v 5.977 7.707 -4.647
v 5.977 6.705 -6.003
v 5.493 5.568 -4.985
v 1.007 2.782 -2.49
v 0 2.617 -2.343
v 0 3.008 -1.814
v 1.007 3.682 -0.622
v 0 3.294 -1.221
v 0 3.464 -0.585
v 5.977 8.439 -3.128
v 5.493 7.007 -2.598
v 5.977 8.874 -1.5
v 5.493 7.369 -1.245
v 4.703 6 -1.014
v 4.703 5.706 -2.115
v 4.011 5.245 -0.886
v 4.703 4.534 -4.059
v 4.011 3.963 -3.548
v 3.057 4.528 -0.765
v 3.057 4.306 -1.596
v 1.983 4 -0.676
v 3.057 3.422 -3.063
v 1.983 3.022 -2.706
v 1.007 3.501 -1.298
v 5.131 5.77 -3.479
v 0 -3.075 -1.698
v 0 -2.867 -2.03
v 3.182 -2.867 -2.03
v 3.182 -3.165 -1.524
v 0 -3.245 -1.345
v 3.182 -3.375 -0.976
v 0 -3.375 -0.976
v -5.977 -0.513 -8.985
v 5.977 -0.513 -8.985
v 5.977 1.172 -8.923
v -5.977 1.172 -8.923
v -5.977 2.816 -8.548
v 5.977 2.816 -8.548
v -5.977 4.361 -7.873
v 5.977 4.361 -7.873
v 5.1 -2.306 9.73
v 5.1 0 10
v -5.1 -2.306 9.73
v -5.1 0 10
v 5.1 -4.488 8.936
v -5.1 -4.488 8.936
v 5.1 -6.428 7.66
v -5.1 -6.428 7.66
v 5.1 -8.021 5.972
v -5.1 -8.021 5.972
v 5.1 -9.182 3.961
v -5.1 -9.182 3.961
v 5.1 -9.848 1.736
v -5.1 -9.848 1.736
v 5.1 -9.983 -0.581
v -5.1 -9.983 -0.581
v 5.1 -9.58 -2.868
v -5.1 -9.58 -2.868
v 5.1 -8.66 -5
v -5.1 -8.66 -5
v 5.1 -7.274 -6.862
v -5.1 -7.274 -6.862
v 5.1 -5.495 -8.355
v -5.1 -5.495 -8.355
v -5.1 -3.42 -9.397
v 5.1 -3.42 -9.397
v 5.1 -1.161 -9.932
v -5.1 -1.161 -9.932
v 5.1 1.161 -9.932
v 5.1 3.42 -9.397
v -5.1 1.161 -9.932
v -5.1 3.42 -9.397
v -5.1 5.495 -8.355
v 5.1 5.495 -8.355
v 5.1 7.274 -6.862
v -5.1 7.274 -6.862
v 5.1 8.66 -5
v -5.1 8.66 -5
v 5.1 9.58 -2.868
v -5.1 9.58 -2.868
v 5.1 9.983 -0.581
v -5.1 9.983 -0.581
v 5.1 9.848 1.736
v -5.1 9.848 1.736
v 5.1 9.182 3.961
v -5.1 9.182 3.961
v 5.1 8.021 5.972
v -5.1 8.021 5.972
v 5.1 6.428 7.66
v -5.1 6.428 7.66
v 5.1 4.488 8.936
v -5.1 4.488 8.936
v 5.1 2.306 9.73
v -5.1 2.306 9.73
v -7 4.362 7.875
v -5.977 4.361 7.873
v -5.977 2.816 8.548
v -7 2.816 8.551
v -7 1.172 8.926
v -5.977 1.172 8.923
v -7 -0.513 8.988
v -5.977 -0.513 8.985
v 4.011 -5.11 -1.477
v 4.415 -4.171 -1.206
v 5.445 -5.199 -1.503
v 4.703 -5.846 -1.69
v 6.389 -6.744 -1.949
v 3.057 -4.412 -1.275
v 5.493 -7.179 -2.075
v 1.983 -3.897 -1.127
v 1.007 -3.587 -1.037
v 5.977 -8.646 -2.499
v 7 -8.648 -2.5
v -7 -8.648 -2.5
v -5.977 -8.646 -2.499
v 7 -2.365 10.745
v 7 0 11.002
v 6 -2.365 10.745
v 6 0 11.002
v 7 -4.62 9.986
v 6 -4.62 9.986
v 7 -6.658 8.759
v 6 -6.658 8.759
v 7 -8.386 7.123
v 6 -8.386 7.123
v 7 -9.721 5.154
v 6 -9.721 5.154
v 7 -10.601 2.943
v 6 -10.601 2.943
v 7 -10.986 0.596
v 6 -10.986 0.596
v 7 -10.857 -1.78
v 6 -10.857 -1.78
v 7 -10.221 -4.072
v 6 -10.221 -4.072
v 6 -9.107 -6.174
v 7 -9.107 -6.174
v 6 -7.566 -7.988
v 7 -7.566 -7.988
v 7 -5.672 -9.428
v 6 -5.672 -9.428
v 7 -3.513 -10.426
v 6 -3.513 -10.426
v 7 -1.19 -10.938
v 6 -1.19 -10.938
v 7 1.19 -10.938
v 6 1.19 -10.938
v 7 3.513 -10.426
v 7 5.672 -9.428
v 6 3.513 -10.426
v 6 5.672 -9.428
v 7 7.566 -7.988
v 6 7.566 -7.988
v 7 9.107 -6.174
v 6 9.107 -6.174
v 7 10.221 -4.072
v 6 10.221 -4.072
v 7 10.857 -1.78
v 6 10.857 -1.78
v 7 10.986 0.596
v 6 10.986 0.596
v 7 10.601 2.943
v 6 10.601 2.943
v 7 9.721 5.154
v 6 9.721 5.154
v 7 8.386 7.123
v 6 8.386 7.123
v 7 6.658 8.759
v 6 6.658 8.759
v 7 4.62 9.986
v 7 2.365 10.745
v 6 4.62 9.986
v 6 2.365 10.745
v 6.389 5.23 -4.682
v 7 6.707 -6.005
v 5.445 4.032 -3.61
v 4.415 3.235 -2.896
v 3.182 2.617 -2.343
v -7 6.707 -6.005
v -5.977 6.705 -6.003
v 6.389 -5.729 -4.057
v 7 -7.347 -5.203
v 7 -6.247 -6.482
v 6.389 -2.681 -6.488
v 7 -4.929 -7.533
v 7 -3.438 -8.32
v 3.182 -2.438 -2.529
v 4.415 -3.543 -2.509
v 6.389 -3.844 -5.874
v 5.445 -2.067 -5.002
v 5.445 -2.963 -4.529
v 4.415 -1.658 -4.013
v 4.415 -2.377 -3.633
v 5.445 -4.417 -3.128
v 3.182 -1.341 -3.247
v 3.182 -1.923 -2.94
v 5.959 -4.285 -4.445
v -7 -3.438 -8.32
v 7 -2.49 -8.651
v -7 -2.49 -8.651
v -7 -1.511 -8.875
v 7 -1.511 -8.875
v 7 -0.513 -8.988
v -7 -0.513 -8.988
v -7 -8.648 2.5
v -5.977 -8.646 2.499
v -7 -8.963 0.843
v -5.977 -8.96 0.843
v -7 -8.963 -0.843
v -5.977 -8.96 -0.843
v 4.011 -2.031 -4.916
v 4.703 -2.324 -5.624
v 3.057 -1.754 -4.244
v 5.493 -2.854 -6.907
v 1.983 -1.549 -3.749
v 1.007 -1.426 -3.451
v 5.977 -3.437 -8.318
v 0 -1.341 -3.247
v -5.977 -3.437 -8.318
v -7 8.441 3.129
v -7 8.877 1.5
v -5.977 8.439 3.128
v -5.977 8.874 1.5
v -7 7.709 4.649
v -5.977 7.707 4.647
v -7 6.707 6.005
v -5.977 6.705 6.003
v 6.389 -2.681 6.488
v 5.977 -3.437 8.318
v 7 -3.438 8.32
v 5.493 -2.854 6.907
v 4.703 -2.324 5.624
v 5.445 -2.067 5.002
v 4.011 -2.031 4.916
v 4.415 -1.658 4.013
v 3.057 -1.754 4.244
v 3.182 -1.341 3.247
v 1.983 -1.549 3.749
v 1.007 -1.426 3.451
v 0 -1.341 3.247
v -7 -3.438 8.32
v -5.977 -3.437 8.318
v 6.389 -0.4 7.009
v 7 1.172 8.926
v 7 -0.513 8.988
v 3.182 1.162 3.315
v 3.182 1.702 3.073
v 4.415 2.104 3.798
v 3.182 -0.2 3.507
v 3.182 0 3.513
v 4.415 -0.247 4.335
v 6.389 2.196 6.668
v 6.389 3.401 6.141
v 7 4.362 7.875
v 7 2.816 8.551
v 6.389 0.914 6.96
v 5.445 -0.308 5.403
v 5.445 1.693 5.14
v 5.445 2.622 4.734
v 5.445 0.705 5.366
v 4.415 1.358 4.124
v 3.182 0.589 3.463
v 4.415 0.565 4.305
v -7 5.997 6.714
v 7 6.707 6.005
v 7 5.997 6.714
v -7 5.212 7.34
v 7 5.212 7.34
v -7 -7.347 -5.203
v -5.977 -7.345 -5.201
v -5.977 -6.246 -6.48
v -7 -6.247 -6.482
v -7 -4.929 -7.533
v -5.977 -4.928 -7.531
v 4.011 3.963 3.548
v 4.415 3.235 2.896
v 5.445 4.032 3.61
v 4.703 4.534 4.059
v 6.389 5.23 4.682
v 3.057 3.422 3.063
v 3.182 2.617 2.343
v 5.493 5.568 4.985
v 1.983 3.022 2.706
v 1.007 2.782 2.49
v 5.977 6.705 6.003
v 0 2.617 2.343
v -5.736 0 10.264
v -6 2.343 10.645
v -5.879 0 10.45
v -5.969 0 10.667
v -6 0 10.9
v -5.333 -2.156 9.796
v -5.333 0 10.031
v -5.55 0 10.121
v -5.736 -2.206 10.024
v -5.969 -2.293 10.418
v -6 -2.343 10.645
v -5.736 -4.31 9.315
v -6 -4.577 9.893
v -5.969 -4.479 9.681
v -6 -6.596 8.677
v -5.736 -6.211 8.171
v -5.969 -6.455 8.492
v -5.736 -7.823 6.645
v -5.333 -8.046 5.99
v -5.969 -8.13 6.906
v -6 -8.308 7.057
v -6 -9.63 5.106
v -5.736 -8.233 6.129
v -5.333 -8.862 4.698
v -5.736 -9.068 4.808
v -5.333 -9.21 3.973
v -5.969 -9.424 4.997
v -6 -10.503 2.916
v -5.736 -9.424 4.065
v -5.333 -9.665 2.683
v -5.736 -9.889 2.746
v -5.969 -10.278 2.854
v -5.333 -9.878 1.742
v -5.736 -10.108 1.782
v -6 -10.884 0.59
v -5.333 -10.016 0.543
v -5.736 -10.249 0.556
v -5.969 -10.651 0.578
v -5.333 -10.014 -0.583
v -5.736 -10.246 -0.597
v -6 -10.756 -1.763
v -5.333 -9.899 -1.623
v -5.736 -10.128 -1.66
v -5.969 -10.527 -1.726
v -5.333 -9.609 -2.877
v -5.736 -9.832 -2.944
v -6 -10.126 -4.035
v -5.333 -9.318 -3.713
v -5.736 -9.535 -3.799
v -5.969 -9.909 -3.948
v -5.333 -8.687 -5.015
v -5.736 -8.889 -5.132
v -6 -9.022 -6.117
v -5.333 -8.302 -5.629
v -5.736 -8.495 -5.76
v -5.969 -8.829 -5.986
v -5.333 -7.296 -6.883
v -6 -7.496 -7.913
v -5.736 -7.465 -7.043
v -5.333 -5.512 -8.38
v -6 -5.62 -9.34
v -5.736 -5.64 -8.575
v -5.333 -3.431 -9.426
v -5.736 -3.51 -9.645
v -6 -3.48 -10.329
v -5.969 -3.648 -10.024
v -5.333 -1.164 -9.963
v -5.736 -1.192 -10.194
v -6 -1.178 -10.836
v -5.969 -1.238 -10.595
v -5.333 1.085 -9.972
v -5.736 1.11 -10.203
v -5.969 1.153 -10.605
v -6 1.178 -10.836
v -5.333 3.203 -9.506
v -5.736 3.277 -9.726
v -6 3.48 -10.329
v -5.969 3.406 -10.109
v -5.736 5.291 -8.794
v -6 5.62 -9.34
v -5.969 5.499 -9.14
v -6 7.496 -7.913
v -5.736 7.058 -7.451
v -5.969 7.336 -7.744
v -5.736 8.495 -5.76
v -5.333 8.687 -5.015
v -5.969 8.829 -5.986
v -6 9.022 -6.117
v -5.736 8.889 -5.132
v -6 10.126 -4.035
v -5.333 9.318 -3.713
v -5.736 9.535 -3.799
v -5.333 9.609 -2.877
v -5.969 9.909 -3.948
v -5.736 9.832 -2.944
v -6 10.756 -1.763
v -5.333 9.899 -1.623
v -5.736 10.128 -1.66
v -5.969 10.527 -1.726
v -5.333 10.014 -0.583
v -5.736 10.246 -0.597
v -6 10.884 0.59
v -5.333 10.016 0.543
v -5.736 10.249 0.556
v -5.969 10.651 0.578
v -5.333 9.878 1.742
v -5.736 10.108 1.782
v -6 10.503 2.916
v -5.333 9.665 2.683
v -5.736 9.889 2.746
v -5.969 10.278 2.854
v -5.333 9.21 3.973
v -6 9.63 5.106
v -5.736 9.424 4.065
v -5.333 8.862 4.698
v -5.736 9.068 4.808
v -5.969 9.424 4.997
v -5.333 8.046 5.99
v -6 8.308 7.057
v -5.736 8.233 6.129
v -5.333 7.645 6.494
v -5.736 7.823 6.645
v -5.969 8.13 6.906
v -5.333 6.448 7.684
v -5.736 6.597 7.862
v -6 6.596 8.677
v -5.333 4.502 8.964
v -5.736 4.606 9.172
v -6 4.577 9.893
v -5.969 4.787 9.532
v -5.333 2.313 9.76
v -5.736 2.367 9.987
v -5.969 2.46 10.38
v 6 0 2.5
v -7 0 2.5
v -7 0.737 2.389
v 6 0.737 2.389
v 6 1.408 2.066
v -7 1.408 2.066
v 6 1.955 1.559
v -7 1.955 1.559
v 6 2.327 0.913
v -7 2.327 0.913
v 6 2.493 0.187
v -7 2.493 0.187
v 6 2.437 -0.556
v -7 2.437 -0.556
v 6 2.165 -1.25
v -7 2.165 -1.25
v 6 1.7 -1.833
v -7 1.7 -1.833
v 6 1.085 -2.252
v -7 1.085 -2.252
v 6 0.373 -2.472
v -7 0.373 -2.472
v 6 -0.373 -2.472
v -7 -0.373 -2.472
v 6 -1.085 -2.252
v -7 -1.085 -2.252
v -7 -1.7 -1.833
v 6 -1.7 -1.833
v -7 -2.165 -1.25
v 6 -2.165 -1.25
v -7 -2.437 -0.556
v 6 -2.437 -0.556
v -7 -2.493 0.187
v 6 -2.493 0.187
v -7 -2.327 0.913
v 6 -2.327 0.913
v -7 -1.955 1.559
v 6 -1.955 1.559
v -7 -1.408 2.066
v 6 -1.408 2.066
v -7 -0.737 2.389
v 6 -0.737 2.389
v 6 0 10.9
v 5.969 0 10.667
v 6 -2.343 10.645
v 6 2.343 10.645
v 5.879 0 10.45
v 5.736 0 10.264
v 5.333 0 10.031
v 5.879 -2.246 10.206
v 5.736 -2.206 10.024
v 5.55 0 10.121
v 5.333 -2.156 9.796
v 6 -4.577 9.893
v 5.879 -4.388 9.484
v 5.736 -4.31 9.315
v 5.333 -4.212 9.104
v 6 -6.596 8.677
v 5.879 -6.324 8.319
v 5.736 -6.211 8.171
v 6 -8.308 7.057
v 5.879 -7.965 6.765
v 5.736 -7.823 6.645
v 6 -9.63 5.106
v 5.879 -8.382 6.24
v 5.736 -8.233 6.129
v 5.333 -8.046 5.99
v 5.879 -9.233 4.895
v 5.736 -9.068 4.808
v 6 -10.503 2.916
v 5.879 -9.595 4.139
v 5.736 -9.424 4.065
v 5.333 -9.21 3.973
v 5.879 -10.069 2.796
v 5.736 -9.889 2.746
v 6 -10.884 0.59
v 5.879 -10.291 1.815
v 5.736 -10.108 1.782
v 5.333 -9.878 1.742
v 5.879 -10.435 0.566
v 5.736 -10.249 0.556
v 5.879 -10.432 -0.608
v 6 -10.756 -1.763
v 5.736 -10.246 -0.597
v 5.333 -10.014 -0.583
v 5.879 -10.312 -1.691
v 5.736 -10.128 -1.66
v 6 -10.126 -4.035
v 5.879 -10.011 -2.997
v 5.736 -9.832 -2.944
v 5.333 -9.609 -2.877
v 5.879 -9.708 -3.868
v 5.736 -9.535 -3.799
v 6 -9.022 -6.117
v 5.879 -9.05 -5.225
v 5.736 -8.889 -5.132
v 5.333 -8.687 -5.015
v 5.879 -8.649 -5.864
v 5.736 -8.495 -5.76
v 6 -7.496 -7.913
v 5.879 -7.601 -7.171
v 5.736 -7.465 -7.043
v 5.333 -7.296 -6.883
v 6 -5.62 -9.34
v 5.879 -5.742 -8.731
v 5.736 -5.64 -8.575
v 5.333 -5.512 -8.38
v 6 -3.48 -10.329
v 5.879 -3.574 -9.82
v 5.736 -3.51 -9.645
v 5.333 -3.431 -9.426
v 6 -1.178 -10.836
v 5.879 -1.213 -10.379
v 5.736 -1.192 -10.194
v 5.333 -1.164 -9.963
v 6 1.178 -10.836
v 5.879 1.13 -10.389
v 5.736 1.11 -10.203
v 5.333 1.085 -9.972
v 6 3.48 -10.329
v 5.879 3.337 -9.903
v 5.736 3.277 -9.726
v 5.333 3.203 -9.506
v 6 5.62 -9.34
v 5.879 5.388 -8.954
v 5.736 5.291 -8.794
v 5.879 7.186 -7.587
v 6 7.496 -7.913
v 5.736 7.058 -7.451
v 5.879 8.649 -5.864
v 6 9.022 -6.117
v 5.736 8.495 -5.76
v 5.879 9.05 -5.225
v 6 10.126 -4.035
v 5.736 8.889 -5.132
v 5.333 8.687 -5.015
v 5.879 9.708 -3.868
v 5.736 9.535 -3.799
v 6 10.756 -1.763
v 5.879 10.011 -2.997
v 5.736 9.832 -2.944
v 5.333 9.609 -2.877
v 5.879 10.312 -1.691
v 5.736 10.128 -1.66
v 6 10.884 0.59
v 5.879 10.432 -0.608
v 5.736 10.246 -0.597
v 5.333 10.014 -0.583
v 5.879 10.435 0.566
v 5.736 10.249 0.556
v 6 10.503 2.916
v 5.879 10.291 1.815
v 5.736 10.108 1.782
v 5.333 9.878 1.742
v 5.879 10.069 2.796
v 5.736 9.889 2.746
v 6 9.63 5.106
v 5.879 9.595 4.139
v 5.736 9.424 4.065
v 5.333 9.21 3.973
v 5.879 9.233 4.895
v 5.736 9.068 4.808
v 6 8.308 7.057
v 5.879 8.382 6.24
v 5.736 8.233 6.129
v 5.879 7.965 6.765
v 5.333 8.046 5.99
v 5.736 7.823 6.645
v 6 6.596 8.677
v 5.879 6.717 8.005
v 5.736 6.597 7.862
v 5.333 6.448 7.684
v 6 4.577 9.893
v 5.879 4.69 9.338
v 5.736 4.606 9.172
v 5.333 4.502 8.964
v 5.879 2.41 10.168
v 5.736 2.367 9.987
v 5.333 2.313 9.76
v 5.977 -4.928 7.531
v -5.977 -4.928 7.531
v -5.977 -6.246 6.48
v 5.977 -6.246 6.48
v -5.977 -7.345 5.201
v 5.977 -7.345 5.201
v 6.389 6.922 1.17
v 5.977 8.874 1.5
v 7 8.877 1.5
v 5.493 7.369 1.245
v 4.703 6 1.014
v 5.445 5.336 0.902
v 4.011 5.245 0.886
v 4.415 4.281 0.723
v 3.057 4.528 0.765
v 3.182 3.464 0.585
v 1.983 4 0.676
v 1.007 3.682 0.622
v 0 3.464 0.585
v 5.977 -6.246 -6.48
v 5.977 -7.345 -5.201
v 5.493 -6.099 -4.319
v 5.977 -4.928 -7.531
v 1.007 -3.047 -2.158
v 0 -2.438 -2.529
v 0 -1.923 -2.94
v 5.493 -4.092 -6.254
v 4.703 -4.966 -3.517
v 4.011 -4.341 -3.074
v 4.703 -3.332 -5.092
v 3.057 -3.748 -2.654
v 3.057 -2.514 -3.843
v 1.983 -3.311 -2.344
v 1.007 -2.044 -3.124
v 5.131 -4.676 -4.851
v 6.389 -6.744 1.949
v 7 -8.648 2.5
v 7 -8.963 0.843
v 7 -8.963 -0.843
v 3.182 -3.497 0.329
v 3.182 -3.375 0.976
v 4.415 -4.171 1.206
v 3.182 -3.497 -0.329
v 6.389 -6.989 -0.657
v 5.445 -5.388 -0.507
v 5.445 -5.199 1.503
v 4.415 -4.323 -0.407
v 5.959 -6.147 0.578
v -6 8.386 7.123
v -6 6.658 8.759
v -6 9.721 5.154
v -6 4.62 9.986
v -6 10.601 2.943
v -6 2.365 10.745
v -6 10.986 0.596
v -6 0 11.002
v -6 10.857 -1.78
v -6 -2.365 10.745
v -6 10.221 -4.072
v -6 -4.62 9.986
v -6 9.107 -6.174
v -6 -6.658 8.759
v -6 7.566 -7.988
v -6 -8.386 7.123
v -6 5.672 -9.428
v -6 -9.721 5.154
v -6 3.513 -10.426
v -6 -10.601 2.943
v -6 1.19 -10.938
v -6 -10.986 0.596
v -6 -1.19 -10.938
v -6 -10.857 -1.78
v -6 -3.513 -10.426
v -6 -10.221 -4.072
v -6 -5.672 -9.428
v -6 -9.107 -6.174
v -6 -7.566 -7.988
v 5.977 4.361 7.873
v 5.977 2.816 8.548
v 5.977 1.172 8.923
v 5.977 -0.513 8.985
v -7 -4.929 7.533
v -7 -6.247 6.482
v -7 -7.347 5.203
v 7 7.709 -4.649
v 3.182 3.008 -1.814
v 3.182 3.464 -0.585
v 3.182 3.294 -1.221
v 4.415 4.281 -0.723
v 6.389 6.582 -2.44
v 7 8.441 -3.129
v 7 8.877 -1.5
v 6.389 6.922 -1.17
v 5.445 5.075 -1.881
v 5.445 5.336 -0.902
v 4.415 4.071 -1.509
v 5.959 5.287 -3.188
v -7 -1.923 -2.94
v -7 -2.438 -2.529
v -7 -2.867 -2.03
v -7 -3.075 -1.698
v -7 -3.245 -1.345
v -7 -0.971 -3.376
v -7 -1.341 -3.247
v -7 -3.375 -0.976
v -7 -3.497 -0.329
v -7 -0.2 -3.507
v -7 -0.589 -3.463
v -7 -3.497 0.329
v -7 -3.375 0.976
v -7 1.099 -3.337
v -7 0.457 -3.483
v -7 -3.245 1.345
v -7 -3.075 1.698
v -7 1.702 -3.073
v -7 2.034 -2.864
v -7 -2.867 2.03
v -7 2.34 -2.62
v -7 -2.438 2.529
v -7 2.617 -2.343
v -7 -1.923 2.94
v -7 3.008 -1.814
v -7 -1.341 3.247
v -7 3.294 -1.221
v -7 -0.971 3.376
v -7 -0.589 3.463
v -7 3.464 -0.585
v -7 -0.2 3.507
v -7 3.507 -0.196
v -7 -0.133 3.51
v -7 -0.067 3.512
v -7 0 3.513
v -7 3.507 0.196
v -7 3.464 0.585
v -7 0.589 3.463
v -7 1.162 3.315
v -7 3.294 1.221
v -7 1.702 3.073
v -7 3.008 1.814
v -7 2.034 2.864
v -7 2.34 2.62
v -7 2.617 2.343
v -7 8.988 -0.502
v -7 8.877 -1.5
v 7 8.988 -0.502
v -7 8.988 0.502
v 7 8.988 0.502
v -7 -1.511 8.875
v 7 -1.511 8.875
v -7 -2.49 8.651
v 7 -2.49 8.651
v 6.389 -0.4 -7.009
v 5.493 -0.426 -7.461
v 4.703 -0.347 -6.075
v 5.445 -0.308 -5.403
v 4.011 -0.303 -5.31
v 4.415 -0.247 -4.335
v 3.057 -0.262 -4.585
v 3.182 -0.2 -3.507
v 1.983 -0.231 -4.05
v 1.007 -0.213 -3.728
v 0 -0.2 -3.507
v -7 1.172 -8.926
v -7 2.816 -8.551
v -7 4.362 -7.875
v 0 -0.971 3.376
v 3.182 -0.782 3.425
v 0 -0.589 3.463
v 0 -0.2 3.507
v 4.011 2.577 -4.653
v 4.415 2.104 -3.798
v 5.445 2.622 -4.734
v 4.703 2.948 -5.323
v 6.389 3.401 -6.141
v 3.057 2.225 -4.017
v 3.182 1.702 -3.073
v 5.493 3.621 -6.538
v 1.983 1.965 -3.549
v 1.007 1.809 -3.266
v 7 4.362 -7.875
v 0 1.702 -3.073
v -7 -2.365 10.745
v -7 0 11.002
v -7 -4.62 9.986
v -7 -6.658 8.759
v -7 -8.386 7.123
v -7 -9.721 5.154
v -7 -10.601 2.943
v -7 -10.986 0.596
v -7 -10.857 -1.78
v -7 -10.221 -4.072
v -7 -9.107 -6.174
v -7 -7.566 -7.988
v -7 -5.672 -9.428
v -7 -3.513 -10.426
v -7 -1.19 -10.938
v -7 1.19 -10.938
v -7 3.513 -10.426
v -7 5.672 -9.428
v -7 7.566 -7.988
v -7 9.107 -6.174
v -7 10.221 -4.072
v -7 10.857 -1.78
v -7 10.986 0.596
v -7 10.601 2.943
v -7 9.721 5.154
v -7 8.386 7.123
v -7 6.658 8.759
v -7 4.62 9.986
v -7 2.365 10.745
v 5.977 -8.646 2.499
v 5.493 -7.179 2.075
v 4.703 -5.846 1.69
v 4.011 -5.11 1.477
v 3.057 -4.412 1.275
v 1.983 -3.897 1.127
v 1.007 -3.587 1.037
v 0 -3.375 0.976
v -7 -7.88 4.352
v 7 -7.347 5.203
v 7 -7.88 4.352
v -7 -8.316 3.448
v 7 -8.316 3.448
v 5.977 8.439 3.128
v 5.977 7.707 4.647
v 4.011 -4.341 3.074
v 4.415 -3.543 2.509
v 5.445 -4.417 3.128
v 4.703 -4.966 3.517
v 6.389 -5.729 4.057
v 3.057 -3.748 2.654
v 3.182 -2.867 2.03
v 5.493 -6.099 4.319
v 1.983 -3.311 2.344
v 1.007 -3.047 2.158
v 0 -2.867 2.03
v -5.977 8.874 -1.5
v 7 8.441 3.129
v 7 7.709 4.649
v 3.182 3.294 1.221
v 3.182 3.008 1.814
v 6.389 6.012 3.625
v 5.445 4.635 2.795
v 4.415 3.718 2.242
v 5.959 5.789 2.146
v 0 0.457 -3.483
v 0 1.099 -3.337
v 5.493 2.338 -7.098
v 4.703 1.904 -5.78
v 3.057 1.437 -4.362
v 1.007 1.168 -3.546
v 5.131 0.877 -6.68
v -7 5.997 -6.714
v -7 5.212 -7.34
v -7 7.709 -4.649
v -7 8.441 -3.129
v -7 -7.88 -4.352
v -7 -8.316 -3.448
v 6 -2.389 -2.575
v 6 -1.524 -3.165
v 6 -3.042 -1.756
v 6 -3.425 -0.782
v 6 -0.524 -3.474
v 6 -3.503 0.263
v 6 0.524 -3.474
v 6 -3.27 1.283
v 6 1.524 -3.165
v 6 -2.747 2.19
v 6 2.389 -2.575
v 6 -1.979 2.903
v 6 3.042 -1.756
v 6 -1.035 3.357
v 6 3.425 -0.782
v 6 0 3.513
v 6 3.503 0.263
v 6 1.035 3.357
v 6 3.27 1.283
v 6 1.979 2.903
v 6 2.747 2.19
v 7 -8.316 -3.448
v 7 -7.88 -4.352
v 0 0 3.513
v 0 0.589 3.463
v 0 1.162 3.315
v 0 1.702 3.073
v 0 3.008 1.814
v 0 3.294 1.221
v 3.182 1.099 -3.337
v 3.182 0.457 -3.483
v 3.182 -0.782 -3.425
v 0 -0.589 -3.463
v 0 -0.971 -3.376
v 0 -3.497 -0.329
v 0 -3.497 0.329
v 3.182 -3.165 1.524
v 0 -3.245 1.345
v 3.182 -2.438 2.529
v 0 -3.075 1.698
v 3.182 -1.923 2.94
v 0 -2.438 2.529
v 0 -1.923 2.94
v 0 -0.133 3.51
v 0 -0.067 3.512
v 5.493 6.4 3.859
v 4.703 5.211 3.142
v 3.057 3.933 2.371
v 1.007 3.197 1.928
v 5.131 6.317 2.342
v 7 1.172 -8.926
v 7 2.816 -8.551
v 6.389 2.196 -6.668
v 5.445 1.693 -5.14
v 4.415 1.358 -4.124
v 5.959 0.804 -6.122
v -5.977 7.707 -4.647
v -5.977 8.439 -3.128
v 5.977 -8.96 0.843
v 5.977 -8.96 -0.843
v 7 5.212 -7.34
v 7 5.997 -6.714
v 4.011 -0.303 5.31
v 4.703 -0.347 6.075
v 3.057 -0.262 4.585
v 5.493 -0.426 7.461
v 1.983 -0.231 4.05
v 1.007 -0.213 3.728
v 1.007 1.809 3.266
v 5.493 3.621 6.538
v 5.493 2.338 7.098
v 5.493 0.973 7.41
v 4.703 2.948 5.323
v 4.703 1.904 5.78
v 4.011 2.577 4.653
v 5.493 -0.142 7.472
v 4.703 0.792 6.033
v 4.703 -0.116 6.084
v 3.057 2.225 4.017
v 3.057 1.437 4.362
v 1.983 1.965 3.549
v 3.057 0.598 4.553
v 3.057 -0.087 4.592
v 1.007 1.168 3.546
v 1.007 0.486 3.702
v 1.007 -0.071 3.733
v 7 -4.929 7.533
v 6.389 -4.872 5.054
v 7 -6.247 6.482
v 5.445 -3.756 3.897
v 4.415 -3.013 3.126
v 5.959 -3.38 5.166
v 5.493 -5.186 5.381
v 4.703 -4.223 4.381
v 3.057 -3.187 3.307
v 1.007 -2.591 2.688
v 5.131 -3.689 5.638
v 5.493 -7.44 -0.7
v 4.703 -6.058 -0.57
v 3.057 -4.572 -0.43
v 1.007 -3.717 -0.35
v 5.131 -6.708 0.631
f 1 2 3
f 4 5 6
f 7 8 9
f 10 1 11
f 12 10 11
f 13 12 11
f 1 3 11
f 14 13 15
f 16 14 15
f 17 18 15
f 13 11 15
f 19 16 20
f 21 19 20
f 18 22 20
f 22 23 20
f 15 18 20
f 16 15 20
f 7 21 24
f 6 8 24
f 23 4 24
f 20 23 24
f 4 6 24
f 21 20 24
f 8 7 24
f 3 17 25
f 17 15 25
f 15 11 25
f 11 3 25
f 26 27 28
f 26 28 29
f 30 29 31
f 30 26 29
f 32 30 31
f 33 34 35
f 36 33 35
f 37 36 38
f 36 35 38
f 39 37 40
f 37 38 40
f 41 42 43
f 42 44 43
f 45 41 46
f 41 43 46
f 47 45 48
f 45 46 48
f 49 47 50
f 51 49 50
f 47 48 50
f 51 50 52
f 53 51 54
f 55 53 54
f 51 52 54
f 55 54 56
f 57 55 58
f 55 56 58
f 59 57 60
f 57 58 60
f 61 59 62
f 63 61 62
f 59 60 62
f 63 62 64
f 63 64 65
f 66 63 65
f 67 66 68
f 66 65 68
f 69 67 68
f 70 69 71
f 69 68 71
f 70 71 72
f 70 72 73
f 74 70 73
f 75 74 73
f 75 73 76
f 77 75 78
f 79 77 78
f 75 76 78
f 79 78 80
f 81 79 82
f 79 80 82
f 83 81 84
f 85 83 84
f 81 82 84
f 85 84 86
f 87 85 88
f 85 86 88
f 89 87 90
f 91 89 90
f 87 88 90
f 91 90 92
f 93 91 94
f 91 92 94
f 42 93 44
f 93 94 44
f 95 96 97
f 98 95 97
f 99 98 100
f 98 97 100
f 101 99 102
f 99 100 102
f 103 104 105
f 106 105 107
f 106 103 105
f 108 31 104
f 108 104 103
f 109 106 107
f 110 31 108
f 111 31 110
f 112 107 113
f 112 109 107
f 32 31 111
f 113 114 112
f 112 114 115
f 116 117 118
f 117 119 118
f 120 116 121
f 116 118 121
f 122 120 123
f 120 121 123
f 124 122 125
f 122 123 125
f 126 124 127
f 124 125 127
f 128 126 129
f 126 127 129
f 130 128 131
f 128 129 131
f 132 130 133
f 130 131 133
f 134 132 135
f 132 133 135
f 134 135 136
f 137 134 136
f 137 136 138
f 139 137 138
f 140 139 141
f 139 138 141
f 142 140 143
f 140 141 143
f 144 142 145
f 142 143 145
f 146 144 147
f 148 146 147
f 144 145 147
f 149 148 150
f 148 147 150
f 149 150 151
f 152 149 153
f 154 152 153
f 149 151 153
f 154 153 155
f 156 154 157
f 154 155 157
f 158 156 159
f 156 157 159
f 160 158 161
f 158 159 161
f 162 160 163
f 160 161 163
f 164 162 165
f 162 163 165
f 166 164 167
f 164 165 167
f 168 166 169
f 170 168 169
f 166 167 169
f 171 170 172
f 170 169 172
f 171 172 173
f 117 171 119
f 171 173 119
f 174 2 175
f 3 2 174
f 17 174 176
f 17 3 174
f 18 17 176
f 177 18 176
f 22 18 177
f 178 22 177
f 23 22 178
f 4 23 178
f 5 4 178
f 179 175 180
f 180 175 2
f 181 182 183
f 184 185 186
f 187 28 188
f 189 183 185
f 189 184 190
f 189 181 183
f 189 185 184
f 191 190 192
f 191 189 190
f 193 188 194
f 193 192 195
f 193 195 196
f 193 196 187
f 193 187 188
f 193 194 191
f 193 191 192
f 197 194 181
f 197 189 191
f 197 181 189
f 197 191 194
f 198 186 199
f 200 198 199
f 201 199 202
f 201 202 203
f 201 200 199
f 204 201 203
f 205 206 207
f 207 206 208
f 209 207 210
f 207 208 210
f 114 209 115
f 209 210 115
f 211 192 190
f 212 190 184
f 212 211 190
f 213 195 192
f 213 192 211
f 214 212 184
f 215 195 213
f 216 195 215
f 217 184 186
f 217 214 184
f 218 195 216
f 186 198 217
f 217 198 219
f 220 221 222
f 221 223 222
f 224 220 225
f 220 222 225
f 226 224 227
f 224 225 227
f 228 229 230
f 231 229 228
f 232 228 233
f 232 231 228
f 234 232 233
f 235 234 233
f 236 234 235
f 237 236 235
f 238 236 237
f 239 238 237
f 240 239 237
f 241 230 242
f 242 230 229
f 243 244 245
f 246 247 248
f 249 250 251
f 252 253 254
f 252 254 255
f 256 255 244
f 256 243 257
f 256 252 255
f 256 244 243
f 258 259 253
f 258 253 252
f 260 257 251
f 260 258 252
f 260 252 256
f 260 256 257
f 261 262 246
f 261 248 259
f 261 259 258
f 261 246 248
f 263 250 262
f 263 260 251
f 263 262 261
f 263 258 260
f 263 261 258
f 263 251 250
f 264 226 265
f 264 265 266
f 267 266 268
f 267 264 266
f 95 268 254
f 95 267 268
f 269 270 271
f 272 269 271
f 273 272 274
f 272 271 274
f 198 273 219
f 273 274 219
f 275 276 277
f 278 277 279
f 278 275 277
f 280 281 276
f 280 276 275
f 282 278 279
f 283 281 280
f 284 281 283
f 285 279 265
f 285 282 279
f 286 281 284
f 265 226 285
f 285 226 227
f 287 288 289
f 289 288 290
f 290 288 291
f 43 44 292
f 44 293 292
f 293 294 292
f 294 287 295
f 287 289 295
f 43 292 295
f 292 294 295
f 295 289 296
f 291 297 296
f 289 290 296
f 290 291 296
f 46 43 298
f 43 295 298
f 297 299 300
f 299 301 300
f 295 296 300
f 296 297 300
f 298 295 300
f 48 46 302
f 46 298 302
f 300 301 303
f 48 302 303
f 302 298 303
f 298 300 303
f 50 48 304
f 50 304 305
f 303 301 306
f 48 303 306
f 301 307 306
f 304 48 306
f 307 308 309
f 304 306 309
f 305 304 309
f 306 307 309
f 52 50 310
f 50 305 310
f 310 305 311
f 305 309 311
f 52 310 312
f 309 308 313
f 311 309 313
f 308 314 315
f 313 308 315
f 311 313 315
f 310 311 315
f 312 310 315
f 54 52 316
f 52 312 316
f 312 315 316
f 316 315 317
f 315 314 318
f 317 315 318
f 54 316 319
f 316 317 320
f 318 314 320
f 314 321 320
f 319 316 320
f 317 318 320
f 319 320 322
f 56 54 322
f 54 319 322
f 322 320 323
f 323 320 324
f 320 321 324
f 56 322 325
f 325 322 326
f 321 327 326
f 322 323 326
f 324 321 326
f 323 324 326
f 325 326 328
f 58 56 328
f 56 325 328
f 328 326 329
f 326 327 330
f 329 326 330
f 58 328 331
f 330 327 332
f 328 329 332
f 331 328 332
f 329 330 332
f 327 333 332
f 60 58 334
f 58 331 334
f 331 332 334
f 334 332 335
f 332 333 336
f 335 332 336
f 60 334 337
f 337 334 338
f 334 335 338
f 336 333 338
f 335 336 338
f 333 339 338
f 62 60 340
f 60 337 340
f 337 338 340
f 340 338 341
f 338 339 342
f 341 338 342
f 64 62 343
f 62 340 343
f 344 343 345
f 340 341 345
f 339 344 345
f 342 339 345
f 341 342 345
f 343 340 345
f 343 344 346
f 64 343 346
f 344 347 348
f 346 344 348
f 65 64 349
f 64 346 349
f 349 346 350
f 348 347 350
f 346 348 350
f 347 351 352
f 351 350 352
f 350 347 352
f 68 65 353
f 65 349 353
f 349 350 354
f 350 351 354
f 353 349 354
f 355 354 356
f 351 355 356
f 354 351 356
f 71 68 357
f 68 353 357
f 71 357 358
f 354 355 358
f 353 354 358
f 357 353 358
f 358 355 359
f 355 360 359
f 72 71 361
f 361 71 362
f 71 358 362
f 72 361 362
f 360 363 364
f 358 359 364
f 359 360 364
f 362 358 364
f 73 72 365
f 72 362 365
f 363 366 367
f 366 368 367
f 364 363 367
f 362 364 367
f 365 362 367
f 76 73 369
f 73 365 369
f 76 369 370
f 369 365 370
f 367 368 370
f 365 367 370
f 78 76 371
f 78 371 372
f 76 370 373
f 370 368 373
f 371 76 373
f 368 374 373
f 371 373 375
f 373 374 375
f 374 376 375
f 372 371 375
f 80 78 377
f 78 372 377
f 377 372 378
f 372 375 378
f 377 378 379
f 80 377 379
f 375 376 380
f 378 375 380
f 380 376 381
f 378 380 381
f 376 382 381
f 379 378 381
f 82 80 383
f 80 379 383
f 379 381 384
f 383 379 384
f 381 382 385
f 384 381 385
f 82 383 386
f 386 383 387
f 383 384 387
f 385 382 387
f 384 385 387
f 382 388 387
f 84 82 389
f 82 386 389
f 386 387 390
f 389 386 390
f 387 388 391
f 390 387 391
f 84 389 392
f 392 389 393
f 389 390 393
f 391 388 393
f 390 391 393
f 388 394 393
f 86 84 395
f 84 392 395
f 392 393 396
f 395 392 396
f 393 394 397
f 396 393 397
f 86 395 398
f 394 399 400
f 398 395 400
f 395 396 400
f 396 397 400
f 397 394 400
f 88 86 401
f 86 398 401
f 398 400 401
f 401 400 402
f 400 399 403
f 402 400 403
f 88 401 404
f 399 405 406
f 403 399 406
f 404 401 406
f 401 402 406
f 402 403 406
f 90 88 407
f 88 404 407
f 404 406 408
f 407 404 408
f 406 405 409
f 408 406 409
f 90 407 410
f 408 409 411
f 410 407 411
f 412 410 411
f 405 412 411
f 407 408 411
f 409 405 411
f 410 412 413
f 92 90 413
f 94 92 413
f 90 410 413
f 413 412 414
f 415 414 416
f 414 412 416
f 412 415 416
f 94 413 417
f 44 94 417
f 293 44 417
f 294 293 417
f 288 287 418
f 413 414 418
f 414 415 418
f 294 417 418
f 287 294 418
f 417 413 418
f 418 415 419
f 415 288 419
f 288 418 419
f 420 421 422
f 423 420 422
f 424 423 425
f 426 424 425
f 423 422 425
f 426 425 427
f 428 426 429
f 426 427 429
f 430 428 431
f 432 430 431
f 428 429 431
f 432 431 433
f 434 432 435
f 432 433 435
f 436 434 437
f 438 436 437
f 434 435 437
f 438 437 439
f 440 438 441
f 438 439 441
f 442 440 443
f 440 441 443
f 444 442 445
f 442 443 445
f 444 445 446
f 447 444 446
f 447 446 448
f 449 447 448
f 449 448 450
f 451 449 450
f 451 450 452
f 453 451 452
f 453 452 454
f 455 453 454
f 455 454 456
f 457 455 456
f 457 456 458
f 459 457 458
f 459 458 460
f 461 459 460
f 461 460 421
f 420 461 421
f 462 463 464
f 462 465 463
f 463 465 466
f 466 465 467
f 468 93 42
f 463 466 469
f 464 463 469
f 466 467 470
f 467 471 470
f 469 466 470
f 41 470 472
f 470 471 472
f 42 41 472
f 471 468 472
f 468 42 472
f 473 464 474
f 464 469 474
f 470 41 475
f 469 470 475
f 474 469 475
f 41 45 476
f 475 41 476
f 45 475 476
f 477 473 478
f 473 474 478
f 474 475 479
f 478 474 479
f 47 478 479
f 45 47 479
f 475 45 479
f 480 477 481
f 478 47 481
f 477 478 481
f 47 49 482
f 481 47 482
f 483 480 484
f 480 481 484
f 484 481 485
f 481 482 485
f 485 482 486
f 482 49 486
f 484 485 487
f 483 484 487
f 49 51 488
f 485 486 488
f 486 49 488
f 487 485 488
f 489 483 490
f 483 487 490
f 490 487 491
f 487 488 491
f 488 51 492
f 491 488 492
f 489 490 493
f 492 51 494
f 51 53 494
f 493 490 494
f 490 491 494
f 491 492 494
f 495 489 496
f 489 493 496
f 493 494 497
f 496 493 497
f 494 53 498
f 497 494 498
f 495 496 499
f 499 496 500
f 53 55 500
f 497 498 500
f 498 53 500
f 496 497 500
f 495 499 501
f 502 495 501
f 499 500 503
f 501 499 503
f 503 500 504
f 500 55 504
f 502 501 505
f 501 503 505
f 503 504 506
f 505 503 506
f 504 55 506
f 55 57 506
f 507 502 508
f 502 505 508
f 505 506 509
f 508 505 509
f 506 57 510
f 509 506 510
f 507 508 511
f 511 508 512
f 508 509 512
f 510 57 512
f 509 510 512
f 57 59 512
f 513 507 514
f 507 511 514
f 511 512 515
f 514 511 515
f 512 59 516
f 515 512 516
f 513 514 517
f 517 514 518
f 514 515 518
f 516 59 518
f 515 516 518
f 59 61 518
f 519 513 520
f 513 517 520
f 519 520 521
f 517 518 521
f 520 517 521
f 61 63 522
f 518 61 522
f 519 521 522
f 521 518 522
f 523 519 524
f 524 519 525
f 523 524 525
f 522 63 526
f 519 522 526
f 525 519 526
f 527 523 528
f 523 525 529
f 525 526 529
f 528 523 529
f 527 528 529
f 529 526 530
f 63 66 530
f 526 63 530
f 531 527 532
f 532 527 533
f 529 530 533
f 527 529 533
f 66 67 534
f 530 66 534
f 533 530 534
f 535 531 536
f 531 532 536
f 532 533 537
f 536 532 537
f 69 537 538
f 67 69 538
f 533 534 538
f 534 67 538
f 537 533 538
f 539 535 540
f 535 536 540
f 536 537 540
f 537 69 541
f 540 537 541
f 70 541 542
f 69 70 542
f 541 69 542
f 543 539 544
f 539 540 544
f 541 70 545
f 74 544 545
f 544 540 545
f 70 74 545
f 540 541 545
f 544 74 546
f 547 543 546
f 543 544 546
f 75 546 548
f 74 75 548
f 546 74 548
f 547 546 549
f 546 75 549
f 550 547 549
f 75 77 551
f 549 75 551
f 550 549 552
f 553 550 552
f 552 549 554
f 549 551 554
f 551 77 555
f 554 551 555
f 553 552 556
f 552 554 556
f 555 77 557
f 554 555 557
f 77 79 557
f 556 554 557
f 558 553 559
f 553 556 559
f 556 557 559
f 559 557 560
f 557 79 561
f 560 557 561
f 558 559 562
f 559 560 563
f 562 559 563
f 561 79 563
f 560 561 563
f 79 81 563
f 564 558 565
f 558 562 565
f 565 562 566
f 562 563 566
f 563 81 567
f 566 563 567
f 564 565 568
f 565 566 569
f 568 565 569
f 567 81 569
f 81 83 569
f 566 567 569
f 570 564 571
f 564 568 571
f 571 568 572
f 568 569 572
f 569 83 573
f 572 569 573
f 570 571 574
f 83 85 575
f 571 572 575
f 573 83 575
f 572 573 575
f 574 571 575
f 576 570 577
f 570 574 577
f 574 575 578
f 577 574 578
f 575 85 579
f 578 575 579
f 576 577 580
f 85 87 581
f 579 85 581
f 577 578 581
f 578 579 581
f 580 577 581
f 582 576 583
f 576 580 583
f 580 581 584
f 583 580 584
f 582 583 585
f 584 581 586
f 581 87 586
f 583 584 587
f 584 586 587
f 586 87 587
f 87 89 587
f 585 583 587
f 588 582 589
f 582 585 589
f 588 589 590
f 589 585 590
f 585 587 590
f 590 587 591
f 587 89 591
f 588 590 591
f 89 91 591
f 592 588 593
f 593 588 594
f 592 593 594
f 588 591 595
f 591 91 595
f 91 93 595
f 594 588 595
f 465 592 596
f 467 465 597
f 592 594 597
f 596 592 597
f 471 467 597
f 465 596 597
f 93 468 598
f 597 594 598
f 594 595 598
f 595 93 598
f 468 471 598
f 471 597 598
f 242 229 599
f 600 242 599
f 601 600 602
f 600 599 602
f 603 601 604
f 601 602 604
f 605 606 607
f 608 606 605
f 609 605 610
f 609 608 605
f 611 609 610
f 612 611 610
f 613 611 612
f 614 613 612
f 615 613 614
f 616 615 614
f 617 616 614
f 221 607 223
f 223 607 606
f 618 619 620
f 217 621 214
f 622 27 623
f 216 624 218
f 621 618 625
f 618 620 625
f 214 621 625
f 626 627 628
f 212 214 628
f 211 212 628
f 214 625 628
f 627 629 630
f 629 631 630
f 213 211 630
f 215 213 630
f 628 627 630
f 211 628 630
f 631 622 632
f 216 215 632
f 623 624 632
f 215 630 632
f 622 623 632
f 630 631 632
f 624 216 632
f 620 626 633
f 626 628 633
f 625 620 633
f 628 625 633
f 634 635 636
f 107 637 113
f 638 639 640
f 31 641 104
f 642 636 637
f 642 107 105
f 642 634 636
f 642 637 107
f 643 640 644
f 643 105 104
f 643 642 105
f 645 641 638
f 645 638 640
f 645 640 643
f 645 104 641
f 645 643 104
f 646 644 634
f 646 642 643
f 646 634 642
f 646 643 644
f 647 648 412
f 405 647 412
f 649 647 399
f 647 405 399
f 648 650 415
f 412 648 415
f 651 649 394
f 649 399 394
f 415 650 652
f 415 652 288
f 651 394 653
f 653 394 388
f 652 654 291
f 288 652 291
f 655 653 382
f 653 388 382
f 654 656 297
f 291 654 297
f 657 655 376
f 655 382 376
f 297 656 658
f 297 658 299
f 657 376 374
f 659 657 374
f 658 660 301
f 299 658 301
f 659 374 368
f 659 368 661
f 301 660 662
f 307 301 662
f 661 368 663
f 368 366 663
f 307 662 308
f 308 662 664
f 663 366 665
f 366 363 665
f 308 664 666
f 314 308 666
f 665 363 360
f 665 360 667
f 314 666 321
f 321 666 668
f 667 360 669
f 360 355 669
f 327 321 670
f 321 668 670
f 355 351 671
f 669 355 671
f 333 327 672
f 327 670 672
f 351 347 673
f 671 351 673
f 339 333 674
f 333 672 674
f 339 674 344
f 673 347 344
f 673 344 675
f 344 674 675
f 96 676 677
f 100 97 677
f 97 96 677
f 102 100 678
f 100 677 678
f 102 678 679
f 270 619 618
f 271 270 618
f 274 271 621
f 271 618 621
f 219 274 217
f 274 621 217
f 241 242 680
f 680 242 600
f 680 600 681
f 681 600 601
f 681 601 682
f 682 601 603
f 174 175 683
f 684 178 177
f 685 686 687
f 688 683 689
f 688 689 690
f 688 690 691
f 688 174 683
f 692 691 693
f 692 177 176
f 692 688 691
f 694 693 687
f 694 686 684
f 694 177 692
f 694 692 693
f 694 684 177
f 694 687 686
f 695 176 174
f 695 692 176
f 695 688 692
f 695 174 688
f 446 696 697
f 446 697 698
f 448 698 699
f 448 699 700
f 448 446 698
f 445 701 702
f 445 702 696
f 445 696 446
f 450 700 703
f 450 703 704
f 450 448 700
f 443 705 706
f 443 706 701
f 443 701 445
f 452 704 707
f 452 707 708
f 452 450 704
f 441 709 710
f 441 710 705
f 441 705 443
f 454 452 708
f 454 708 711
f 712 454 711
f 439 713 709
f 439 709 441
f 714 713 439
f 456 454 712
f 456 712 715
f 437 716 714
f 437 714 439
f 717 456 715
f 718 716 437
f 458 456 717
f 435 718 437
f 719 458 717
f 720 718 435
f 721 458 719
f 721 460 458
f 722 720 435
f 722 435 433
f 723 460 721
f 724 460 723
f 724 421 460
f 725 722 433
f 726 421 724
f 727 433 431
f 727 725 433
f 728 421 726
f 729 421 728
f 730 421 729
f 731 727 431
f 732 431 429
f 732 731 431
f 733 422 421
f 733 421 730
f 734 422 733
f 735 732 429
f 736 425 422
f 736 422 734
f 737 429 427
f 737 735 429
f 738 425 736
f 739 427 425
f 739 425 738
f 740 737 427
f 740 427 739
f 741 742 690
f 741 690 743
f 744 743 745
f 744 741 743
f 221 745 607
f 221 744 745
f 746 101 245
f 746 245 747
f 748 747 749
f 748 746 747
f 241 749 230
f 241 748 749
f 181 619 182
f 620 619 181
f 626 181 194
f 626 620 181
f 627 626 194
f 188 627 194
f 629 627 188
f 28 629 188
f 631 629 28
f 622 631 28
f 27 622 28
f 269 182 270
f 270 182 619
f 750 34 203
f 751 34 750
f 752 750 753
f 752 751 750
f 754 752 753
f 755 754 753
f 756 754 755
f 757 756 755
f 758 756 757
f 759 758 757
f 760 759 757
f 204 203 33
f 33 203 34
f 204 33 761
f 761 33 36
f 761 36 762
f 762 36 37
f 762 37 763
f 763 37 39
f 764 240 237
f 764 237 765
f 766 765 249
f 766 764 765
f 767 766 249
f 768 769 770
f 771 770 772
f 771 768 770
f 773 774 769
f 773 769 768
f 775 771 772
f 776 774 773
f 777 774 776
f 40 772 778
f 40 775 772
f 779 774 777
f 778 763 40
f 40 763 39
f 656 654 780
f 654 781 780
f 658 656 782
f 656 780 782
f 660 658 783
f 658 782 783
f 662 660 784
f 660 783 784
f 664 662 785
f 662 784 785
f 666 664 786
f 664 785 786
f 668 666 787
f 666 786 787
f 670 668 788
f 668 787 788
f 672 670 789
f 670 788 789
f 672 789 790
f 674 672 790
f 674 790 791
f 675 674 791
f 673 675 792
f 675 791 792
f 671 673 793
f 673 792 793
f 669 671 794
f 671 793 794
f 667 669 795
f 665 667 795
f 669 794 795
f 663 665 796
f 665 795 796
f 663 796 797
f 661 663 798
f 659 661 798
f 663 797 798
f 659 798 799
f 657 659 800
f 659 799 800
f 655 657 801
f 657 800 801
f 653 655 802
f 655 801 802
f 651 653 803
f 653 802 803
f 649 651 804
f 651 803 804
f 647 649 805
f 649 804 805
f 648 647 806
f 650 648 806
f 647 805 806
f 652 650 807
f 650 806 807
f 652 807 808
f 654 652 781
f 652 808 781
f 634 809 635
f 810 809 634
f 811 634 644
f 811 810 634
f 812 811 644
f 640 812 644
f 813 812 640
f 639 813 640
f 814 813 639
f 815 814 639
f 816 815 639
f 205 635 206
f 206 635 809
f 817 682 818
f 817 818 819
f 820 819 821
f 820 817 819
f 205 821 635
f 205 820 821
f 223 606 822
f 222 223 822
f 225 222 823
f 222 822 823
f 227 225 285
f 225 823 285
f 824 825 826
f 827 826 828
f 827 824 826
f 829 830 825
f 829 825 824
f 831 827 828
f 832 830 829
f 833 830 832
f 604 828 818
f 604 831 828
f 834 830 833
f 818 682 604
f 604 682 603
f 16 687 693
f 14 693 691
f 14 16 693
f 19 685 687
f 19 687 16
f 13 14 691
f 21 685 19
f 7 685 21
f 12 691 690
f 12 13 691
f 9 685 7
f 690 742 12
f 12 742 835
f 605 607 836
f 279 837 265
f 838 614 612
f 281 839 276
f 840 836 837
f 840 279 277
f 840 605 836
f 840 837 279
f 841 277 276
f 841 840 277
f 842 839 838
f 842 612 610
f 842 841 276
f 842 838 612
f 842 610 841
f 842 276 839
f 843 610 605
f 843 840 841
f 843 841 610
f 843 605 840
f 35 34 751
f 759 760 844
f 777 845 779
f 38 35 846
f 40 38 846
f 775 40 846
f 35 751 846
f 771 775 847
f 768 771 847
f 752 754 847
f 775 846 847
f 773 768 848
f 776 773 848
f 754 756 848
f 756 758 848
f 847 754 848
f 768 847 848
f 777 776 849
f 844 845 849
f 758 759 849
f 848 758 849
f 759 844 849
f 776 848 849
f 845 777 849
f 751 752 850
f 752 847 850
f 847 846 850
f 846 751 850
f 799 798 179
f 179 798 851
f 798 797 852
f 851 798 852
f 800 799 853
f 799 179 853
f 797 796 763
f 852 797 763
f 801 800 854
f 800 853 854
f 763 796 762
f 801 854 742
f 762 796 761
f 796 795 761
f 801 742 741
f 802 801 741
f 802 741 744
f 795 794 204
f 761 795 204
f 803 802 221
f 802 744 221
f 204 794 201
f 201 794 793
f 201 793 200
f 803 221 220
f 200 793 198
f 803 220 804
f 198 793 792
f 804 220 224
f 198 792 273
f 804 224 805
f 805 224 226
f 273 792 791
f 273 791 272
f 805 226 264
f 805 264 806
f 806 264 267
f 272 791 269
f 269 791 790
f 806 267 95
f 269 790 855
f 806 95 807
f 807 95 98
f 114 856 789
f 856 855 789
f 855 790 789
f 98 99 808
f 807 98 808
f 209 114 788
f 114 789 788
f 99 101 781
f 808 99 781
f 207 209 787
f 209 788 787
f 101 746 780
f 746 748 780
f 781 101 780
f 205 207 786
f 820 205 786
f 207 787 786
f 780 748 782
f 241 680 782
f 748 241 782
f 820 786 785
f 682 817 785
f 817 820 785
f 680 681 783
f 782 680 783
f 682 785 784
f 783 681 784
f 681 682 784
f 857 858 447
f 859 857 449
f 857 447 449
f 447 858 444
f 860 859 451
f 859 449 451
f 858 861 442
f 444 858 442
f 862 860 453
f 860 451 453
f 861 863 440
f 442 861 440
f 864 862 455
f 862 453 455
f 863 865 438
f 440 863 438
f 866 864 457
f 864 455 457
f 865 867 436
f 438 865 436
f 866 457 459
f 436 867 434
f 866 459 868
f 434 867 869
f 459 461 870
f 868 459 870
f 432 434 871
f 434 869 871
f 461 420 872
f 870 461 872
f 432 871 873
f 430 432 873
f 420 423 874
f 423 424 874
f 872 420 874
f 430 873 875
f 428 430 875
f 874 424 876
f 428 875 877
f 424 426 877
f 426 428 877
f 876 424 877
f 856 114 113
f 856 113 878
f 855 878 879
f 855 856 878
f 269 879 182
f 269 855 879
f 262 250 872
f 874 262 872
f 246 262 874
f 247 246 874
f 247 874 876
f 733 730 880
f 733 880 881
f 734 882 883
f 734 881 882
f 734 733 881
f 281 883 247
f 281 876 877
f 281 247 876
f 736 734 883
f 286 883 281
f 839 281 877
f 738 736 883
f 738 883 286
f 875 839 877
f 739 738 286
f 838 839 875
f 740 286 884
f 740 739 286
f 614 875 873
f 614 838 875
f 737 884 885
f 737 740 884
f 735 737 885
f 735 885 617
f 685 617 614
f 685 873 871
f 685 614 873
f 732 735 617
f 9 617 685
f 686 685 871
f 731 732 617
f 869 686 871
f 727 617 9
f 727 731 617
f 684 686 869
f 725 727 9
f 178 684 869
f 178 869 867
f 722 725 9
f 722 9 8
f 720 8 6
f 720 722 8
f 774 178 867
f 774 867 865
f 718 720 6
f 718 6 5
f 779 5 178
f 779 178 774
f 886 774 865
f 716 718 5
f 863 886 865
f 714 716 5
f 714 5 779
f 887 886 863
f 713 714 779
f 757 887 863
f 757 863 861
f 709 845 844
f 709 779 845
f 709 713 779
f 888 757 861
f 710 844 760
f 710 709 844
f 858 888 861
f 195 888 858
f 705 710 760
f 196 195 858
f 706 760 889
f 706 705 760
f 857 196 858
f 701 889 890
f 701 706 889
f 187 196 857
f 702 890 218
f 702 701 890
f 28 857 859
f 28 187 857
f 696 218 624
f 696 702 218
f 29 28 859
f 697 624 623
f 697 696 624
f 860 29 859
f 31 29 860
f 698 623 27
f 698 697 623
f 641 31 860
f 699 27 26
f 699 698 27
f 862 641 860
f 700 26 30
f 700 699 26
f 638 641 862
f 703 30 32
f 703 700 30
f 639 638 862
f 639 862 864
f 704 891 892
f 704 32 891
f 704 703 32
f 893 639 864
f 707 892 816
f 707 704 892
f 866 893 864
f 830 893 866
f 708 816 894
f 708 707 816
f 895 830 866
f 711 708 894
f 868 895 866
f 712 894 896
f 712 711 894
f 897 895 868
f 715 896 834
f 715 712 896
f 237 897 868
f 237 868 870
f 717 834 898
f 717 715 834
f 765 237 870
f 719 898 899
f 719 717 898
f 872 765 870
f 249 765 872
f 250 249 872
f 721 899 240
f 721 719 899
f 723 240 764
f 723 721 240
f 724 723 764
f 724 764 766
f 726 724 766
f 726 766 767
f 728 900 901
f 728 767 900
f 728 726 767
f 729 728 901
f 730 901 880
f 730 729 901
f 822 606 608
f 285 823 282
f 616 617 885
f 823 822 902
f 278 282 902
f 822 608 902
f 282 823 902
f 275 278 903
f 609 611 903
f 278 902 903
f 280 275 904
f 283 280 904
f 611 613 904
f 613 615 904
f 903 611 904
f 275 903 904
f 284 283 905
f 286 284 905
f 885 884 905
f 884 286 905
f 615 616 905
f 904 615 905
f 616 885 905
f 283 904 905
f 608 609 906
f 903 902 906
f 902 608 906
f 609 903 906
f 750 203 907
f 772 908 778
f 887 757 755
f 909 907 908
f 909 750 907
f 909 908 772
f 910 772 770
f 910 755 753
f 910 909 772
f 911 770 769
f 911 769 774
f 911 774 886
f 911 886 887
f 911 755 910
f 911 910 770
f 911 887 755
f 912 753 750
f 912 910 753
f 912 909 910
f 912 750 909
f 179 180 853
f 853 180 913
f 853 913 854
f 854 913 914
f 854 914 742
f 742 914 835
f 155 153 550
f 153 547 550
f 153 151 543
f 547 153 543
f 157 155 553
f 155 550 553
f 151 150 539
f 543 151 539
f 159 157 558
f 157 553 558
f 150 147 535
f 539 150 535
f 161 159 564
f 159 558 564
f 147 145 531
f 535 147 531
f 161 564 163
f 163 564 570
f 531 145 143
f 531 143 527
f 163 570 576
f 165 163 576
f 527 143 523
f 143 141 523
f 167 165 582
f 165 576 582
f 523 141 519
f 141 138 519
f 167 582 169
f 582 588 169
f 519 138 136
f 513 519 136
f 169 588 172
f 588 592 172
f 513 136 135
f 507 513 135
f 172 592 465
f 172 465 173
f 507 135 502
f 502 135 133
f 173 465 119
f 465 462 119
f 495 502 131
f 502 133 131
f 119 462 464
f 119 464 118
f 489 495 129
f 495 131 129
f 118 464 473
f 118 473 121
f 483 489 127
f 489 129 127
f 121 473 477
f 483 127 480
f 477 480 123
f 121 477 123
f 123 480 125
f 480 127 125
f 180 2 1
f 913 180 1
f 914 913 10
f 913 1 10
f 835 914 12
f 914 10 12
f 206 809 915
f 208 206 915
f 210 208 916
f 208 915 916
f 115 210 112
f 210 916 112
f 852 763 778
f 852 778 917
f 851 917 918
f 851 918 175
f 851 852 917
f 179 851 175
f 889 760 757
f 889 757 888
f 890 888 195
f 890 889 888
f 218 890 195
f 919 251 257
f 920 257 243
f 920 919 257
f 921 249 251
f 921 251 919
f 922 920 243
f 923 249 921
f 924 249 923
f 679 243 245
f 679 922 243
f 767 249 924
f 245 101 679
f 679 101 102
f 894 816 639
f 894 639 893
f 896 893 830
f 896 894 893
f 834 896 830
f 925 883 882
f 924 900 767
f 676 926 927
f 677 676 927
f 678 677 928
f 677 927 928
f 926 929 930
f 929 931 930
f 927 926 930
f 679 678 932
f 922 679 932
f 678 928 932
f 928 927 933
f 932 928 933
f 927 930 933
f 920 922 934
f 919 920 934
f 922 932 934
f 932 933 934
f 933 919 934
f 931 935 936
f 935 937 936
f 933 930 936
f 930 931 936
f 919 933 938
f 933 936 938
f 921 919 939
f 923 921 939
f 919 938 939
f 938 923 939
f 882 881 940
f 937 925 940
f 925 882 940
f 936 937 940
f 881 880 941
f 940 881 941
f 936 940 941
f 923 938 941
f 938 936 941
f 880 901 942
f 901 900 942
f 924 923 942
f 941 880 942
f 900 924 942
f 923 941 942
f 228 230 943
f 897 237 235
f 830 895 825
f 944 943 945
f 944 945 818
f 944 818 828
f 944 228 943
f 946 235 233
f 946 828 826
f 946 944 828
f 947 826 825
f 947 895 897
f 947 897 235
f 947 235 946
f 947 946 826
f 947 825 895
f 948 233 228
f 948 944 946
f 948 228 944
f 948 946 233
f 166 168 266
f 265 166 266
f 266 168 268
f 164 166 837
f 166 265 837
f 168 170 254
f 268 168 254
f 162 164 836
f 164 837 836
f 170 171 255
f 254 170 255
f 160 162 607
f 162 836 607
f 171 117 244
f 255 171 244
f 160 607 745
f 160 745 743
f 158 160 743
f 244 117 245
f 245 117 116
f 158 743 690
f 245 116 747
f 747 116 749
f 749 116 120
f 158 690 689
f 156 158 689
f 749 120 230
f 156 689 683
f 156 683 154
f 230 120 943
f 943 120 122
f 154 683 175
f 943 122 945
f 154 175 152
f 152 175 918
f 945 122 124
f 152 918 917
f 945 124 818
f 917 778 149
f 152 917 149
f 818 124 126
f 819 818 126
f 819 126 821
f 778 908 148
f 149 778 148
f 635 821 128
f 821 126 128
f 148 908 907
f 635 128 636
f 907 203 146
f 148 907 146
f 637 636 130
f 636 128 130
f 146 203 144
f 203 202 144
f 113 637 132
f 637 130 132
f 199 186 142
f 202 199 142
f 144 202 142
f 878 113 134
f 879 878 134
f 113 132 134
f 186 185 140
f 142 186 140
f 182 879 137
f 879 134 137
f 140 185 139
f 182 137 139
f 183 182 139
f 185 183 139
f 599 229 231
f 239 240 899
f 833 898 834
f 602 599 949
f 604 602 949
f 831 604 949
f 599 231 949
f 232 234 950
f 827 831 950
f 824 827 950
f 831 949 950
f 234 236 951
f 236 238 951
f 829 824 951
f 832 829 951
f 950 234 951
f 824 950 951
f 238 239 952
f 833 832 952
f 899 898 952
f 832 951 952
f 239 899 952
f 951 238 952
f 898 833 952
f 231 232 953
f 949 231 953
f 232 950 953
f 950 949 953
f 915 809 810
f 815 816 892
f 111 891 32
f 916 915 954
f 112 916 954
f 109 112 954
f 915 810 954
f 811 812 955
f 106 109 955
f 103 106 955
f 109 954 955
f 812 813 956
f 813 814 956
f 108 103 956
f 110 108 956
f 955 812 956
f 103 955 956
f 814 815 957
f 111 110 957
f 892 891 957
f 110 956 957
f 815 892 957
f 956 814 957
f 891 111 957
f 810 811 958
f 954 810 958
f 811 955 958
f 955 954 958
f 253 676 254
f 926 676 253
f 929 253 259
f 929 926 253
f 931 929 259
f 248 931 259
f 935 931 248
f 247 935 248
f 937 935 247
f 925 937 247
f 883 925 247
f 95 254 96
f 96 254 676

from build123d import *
from build123d.topology import SkipClean

# Parameters (mm, degrees)
SKETCH3_R           = 3.512937447
SKETCH3_R_2         = 2.5
BOSS_EXTRUDE3_DEPTH = 13
SKETCH5_R           = 2.5
CUT_EXTRUDE9_DEPTH  = 21.930995525


with BuildPart() as part:
    # Sketch1 → Revolve1 (revolve)
    with BuildSketch(Plane.XY):
        with BuildLine():
            Line((-5.977318778, 9), (5.977318778, 9))
            add(Edge.make_bspline(
                [(5.977318778, 9), (5.971811367, 8.975222227), (5.562087836, 7.215033632), (4.069266539, 5.252557202), (1.935066771, 3.855081597), (0.019003444, 3.516133425), (0, 3.512937447)],
                knots=[0.019778015, 0.019778015, 0.019778015, 0.024722519, 0.375, 0.625, 0.982243258, 0.985794607, 0.985794607, 0.985794607], degree=2))
            Line((0, 3.512937447), (0, 2.5))
            add(Edge.make_bspline(
                [(6.999999581, 9.002422396), (5.87124706, 3.409561407), (0, 2.5)],
                knots=[0, 0, 0, 1, 1, 1], degree=2))
            Line((6.999999581, 9.002422396), (6.999999581, 11.002422396))
            Line((6.999999581, 11.002422396), (5.999999581, 11.002422396))
            Line((5.999999581, 11.002422396), (5.999999581, 10.9))
            ThreePointArc((5.999999581, 10.9), (5.736395684, 10.263603897), (5.099999581, 10))
            Line((5.099999581, 10), (-5.099999581, 10))
            ThreePointArc((-5.099999581, 10), (-5.736395684, 10.263603897), (-5.999999581, 10.9))
            Line((-5.999999581, 10.9), (-5.999999581, 11.002422396))
            Line((-5.999999581, 11.002422396), (-6.999999581, 11.002422396))
            Line((-6.999999581, 11.002422396), (-6.999999581, 9.002422396))
            Line((-6.999999581, 9.002422396), (-5.977318778, 9))
        make_face()
    revolve(axis=Axis((0, 0, 0), (1, 0, 0)))

    # Sketch3 → Boss-Extrude3 (add)
    with BuildSketch(Plane.ZY.offset(6.999999581)):
        Circle(SKETCH3_R)
        Circle(SKETCH3_R_2, mode=Mode.SUBTRACT)
    extrude(amount=-BOSS_EXTRUDE3_DEPTH)

    # Sketch5 → Cut-Extrude9 (cut, through all)
    with SkipClean():  # the faces are left unmerged after this step: merging them gives an invalid solid
        with BuildSketch(Plane(origin=(6.999999581, 0, 0), x_dir=(0, 0, -1), z_dir=(1, 0, 0))):
            with BuildLine():
                Line((-1.5, 8.876576423), (-0.585332029, 3.463829661))
                ThreePointArc((-0.585332029, 3.463829661), (0, 3.512937447), (0.585332029, 3.463829661))
                Line((0.585332029, 3.463829661), (1.5, 8.876576423))
                ThreePointArc((1.5, 8.876576423), (0, 9.002422396), (-1.5, 8.876576423))
            make_face()
            with BuildLine():
                ThreePointArc((-3.07307963, 1.702031461), (-2.746525092, 2.190280673), (-2.343182528, 2.617293478))
                Line((-2.343182528, 2.617293478), (-6.004752201, 6.707202099))
                ThreePointArc((-6.004752201, 6.707202099), (-7.038377248, 5.612918556), (-7.875221607, 4.361707651))
                Line((-7.875221607, 4.361707651), (-3.07307963, 1.702031461))
            make_face()
            with BuildLine():
                Line((6.004752201, 6.707202099), (2.343182528, 2.617293478))
                ThreePointArc((2.343182528, 2.617293478), (2.746525092, 2.190280673), (3.07307963, 1.702031461))
                Line((3.07307963, 1.702031461), (7.875221607, 4.361707651))
                ThreePointArc((7.875221607, 4.361707651), (7.038377248, 5.612918556), (6.004752201, 6.707202099))
            make_face()
            with BuildLine():
                ThreePointArc((-3.24673559, -1.341431145), (-3.424860771, -0.781702122), (-3.50723285, -0.200118078))
                Line((-3.50723285, -0.200118078), (-8.98780352, -0.512832208))
                ThreePointArc((-8.98780352, -0.512832208), (-8.776712871, -2.003227439), (-8.320240718, -3.437615944))
                Line((-8.320240718, -3.437615944), (-3.24673559, -1.341431145))
            make_face()
            with BuildLine():
                Line((8.98780352, -0.512832208), (3.50723285, -0.200118078))
                ThreePointArc((3.50723285, -0.200118078), (3.424860771, -0.781702122), (3.24673559, -1.341431145))
                Line((3.24673559, -1.341431145), (8.320240718, -3.437615944))
                ThreePointArc((8.320240718, -3.437615944), (8.776712871, -2.003227439), (8.98780352, -0.512832208))
            make_face()
            with BuildLine():
                ThreePointArc((-0.975533429, -3.374768738), (-1.524206435, -3.165047275), (-2.030265301, -2.866836639))
                Line((-2.030265301, -2.866836639), (-5.202855471, -7.346693402))
                ThreePointArc((-5.202855471, -7.346693402), (-3.90600469, -8.110902314), (-2.499948867, -8.648344619))
                Line((-2.499948867, -8.648344619), (-0.975533429, -3.374768738))
            make_face()
            with BuildLine():
                Line((5.202855471, -7.346693402), (2.030265301, -2.866836639))
                ThreePointArc((2.030265301, -2.866836639), (1.524206435, -3.165047275), (0.975533429, -3.374768738))
                Line((0.975533429, -3.374768738), (2.499948867, -8.648344619))
                ThreePointArc((2.499948867, -8.648344619), (3.90600469, -8.110902314), (5.202855471, -7.346693402))
            make_face()
            Circle(SKETCH5_R)
        extrude(amount=-CUT_EXTRUDE9_DEPTH, mode=Mode.SUBTRACT)
    add(part.part.scale(1), mode=Mode.REPLACE)  # the faces are merged on a copy


solid = part.part
